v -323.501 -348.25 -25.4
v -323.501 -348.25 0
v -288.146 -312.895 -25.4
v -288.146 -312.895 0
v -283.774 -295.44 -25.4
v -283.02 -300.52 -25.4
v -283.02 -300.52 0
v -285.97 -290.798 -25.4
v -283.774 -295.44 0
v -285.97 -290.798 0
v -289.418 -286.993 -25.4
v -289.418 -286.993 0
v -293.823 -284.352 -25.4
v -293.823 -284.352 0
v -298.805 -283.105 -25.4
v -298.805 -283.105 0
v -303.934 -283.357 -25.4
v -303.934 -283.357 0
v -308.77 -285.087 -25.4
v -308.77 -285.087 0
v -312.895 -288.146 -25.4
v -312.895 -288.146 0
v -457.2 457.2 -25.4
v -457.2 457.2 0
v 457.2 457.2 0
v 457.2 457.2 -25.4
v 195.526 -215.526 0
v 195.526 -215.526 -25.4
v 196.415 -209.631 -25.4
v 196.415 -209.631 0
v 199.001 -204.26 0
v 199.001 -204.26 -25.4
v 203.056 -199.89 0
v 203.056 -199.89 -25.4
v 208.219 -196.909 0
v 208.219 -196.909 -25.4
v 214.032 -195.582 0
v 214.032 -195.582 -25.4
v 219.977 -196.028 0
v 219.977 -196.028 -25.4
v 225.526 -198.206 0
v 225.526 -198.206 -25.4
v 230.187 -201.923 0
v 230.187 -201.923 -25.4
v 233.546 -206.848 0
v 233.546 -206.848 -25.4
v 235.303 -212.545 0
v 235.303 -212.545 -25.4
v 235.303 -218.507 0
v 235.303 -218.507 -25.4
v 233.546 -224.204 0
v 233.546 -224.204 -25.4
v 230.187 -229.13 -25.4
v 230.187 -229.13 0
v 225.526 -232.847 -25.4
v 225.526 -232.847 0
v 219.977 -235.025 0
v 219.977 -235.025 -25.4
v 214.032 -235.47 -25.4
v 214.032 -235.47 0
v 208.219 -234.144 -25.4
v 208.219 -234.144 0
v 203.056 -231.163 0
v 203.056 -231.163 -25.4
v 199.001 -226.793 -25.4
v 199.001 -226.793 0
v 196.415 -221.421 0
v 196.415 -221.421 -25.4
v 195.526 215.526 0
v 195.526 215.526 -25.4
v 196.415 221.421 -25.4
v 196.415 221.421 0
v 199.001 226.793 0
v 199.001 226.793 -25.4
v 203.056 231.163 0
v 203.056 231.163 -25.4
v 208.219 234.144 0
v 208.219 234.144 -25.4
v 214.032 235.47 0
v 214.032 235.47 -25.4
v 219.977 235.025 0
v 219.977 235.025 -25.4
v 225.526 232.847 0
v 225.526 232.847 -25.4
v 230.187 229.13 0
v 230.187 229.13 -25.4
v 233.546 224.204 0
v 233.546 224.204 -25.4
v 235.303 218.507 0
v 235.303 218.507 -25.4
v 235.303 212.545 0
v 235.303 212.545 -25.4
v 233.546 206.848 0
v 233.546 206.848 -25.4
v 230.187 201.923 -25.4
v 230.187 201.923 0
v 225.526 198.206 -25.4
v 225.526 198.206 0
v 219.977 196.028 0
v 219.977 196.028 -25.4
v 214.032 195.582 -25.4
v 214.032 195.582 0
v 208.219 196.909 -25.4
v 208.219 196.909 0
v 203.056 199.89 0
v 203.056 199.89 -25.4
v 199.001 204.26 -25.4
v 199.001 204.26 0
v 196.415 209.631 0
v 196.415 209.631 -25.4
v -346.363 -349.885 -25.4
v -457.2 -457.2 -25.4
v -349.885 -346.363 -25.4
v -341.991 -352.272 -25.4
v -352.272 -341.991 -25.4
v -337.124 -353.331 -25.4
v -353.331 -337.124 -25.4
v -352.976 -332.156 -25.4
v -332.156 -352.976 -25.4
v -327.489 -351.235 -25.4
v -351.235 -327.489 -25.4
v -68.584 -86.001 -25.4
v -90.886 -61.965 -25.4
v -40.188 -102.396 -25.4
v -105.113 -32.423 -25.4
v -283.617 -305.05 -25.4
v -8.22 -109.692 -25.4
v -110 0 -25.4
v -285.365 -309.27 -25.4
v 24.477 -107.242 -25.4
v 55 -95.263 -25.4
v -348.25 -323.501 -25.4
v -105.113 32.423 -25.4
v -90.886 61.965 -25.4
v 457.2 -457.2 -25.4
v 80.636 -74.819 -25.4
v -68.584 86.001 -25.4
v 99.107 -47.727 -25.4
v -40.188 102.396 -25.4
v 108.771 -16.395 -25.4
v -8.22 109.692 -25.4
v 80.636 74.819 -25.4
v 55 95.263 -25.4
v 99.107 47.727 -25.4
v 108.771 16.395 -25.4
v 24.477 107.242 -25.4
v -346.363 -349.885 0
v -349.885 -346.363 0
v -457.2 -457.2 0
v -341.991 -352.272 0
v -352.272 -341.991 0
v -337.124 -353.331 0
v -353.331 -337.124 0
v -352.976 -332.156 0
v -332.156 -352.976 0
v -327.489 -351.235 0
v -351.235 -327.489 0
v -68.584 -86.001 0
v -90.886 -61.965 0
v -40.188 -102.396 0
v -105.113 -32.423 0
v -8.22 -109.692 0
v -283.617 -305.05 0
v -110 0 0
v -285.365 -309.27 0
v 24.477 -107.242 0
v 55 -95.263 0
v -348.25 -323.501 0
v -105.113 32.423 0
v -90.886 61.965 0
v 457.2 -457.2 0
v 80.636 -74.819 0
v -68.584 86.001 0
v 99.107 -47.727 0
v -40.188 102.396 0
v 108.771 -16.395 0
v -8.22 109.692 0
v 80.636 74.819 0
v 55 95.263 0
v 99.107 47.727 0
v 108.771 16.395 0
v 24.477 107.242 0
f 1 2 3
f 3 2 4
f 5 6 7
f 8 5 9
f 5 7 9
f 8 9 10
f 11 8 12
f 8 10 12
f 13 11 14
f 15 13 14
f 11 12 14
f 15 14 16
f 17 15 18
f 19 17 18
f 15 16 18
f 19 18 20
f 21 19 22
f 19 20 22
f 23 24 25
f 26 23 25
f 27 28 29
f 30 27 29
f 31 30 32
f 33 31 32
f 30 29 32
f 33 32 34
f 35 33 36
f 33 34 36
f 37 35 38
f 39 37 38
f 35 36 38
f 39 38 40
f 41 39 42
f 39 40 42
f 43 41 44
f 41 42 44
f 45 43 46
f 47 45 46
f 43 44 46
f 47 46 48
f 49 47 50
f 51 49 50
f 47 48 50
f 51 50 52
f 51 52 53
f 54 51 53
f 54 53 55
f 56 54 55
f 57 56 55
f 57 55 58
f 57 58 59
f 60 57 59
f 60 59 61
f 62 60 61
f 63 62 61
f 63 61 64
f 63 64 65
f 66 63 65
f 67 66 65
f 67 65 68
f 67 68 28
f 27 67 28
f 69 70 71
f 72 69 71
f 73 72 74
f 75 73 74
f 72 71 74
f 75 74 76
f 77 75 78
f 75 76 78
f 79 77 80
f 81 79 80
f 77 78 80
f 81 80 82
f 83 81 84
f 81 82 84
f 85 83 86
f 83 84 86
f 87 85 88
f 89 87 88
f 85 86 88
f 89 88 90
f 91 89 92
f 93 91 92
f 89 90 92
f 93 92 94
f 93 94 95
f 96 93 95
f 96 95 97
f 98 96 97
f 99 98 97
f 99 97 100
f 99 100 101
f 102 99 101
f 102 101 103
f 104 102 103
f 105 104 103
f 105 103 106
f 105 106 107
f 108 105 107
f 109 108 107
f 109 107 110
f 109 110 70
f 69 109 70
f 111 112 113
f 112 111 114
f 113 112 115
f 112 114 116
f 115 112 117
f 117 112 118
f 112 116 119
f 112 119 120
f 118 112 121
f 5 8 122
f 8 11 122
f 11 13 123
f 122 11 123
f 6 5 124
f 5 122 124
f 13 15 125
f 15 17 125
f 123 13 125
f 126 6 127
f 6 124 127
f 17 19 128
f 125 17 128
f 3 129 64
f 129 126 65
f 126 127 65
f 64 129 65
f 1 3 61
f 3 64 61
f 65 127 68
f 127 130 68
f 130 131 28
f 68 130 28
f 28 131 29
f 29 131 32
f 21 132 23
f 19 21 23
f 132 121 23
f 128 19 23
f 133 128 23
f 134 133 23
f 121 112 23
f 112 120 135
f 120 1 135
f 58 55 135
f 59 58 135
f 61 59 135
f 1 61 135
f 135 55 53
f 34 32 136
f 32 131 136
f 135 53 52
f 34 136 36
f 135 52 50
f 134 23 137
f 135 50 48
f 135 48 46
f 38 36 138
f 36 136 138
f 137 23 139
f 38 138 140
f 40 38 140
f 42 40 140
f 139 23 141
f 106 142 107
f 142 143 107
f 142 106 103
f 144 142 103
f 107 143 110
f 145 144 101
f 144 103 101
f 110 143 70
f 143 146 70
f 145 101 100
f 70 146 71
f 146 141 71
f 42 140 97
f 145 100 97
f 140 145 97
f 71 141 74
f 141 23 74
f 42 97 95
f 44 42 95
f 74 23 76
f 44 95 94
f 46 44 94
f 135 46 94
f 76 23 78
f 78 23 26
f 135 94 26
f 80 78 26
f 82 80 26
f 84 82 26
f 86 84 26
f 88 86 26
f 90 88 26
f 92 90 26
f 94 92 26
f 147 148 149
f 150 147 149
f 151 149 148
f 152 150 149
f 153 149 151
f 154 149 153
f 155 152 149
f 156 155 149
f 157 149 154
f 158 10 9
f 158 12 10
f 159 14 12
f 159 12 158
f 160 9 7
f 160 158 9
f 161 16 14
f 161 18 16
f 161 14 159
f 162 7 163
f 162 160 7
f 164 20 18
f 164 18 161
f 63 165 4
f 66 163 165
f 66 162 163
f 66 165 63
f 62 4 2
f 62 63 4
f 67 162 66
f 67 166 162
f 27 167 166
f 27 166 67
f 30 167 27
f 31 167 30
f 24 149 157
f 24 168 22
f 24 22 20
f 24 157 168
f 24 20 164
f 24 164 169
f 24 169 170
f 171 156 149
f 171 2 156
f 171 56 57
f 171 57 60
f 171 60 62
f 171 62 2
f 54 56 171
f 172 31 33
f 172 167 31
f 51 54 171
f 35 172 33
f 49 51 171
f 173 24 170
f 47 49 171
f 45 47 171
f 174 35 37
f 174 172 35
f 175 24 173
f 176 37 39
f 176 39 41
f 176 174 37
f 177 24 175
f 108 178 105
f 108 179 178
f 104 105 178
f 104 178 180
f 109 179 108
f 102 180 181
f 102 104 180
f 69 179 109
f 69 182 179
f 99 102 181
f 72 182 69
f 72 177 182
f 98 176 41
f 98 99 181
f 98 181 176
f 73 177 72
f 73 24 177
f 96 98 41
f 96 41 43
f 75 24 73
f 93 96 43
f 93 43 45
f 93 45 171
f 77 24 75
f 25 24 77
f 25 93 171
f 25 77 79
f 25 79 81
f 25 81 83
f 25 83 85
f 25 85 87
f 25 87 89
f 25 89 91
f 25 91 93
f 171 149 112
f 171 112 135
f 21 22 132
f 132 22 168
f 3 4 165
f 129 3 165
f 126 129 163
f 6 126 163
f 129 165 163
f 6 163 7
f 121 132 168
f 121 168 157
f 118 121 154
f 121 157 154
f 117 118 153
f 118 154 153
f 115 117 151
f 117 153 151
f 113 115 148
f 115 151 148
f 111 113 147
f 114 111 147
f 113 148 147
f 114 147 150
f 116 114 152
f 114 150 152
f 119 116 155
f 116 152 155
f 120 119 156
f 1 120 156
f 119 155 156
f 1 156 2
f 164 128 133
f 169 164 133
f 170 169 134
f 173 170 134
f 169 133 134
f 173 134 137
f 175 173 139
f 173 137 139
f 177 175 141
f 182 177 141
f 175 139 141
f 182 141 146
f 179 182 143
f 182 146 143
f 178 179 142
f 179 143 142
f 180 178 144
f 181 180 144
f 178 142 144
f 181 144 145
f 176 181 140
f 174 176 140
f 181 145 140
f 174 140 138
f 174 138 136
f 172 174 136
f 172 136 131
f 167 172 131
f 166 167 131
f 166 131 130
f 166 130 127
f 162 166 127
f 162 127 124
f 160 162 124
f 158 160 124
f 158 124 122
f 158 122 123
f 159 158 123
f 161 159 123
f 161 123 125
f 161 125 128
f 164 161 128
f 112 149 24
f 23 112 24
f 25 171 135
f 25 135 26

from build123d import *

# Parameters (mm, degrees)
F0_W     = 914.4
F0_H     = 914.4
F1_DEPTH = 25.4
F3_D     = 220
F5_D     = 40
F7_DEPTH = 25.401


with BuildPart() as f1:
    # F0 (on Top) → F1 (new body)
    with BuildSketch(Plane.XY):
        Rectangle(F0_W, F0_H)
    extrude(amount=-F1_DEPTH)

    # F3 (through all)
    with Locations(Plane.XY):
        with Locations((0, 0)):
            Hole(F3_D / 2)

    # F5 (through all)
    with Locations(Plane.XY):
        with Locations((215.5261469057, 215.5261469057), (215.5261469057, -215.5261469057)):
            Hole(F5_D / 2)

    # F6 (on face) → F7 (cut, through all)
    with BuildSketch(Plane.XY):
        with BuildLine():
            ThreePointArc((-288.1460133335, -312.894750675), (-300.5203820043, -318.0203820043), (-312.894750675, -312.894750675))
            Line((-312.894750675, -312.894750675), (-323.5013523928, -323.5013523928))
            ThreePointArc((-323.5013523928, -323.5013523928), (-319.7078292447, -329.1787609972), (-318.3757210636, -335.8757210636))
            ThreePointArc((-318.3757210636, -335.8757210636), (-319.7078292447, -342.57268113), (-323.5013523928, -348.2500897344))
            Line((-323.5013523928, -348.2500897344), (-288.1460133335, -312.894750675))
        make_face()
        with BuildLine():
            ThreePointArc((-318.3757210636, -335.8757210636), (-319.7078292447, -329.1787609972), (-323.5013523928, -323.5013523928))
            ThreePointArc((-323.5013523928, -323.5013523928), (-335.8757210636, -318.3757210636), (-348.2500897344, -323.5013523928))
            ThreePointArc((-348.2500897344, -323.5013523928), (-348.2500897344, -348.2500897344), (-323.5013523928, -348.2500897344))
            ThreePointArc((-323.5013523928, -348.2500897344), (-319.7078292447, -342.57268113), (-318.3757210636, -335.8757210636))
        make_face()
        with BuildLine():
            Line((-323.5013523928, -323.5013523928), (-312.894750675, -312.894750675))
            ThreePointArc((-312.894750675, -312.894750675), (-318.0203820043, -300.5203820043), (-312.894750675, -288.1460133335))
            Line((-312.894750675, -288.1460133335), (-348.2500897344, -323.5013523928))
            ThreePointArc((-348.2500897344, -323.5013523928), (-335.8757210636, -318.3757210636), (-323.5013523928, -323.5013523928))
        make_face()
        with BuildLine():
            ThreePointArc((-283.0203820043, -300.5203820043), (-284.3524901853, -293.8234219379), (-288.1460133335, -288.1460133335))
            Line((-288.1460133335, -288.1460133335), (-312.894750675, -312.894750675))
            ThreePointArc((-312.894750675, -312.894750675), (-300.5203820043, -318.0203820043), (-288.1460133335, -312.894750675))
            ThreePointArc((-288.1460133335, -312.894750675), (-284.3524901853, -307.2173420707), (-283.0203820043, -300.5203820043))
        make_face()
        with BuildLine():
            Line((-312.894750675, -312.894750675), (-288.1460133335, -288.1460133335))
            ThreePointArc((-288.1460133335, -288.1460133335), (-300.5203820043, -283.0203820043), (-312.894750675, -288.1460133335))
            ThreePointArc((-312.894750675, -288.1460133335), (-318.0203820043, -300.5203820043), (-312.894750675, -312.894750675))
        make_face()
    extrude(amount=-F7_DEPTH, mode=Mode.SUBTRACT)


solid = f1.part
